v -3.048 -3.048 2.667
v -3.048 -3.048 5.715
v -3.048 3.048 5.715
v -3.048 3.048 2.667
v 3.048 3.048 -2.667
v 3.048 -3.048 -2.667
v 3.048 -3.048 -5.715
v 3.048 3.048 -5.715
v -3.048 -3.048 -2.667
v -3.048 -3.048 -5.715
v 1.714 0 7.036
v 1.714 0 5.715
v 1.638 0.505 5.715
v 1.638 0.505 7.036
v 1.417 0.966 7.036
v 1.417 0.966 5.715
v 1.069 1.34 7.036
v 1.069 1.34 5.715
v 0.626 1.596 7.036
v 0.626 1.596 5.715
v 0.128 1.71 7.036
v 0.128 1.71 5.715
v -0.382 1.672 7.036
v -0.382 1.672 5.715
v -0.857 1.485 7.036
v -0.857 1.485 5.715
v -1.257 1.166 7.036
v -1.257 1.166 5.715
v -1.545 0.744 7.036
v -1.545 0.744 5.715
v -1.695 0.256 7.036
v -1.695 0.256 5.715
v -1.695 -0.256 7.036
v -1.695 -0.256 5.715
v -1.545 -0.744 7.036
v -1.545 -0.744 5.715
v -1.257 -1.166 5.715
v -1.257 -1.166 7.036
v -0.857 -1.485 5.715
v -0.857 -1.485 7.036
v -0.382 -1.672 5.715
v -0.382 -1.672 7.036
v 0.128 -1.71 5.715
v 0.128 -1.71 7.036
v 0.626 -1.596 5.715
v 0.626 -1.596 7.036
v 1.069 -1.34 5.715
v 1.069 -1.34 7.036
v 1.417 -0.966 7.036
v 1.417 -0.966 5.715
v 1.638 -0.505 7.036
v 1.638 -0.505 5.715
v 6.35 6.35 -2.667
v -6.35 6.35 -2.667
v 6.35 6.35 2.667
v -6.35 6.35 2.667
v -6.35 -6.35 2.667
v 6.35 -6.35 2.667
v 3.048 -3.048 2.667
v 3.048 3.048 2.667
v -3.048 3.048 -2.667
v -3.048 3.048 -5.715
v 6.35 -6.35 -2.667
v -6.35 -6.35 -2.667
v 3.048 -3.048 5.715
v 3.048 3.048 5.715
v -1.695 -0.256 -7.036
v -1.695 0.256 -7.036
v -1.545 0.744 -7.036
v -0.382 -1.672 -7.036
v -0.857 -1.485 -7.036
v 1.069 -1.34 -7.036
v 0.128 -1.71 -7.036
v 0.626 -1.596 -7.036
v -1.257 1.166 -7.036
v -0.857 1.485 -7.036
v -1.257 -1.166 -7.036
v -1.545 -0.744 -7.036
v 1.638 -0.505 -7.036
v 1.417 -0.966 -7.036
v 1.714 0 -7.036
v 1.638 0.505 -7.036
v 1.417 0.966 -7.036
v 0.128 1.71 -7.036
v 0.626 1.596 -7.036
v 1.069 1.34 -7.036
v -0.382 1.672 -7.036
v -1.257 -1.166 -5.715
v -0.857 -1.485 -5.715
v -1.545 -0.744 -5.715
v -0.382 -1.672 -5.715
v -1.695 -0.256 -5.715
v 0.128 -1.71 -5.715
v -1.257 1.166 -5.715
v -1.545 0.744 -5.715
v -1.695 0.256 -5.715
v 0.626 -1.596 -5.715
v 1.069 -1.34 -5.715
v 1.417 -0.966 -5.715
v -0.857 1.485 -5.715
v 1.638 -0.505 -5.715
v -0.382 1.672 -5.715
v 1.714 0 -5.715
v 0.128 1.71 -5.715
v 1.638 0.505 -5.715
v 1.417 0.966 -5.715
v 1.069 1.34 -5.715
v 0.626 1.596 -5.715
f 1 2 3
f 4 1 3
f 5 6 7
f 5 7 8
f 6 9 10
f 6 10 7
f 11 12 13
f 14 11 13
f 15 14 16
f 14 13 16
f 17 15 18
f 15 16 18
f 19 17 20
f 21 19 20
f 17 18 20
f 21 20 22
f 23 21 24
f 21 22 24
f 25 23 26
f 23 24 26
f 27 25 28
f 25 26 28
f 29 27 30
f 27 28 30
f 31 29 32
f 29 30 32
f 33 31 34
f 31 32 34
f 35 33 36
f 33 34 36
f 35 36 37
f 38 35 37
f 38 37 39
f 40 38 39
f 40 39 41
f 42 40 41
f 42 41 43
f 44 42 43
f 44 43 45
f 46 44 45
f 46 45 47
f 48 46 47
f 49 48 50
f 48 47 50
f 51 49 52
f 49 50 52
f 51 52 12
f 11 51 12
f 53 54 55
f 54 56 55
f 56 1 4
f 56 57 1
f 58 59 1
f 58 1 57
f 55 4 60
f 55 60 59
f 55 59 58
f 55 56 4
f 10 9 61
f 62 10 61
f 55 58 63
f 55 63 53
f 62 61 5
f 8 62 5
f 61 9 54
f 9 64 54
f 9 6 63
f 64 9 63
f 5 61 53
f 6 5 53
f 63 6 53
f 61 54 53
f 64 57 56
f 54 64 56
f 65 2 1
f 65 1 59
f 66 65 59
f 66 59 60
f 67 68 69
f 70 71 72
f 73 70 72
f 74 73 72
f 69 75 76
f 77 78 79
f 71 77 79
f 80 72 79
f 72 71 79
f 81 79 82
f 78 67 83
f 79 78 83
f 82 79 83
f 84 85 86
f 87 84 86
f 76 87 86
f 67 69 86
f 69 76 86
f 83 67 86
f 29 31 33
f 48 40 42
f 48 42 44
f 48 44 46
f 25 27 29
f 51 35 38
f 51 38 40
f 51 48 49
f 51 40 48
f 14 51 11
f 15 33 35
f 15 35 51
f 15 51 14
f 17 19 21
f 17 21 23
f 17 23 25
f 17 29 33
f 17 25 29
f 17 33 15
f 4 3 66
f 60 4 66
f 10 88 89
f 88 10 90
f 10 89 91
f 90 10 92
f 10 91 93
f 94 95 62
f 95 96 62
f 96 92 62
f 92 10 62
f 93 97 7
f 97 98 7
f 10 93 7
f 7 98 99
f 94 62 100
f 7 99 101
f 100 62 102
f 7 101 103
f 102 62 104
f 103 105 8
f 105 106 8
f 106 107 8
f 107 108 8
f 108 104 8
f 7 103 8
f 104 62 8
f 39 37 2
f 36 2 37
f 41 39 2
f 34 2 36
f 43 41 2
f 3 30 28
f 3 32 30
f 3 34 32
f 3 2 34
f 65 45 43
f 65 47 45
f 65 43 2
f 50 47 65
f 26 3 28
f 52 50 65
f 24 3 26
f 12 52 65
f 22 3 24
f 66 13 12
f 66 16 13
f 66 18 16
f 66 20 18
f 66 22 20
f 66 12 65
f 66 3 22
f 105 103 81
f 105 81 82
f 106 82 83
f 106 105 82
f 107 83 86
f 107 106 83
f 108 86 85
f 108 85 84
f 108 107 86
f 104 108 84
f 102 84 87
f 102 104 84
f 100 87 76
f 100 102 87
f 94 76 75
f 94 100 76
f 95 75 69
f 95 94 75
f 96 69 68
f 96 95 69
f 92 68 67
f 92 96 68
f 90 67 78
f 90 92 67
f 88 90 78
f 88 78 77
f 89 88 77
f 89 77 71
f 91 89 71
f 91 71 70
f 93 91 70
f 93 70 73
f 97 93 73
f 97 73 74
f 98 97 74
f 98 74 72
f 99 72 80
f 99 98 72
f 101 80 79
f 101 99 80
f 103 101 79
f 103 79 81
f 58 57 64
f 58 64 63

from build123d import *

# Parameters (mm, degrees)
SKETCH3_W           = 6.096
SKETCH3_H           = 6.096
BOSS_EXTRUDE1_DEPTH = 5.715
SKETCH4_R           = 1.7145
BOSS_EXTRUDE2_DEPTH = 1.3208
SKETCH5_W           = 12.7
SKETCH5_H           = 12.7
BOSS_EXTRUDE4_DEPTH = 2.667


with BuildPart() as part:
    # Sketch3 → Boss-Extrude1 (new, symmetric)
    with BuildSketch(Plane.XY):
        Rectangle(SKETCH3_W, SKETCH3_H)
    extrude(amount=BOSS_EXTRUDE1_DEPTH, both=True)

    # Sketch4 → Boss-Extrude2 (add)
    with BuildSketch(Plane.XY.offset(5.715)):
        Circle(SKETCH4_R)
    boss_extrude2 = extrude(amount=BOSS_EXTRUDE2_DEPTH)

    # Mirror1: Boss-Extrude2 across plane
    add(boss_extrude2.mirror(Plane.XY))

    # Sketch5 → Boss-Extrude4 (add, symmetric)
    with BuildSketch(Plane.XY):
        Rectangle(SKETCH5_W, SKETCH5_H)
    extrude(amount=BOSS_EXTRUDE4_DEPTH, both=True)


solid = part.part
